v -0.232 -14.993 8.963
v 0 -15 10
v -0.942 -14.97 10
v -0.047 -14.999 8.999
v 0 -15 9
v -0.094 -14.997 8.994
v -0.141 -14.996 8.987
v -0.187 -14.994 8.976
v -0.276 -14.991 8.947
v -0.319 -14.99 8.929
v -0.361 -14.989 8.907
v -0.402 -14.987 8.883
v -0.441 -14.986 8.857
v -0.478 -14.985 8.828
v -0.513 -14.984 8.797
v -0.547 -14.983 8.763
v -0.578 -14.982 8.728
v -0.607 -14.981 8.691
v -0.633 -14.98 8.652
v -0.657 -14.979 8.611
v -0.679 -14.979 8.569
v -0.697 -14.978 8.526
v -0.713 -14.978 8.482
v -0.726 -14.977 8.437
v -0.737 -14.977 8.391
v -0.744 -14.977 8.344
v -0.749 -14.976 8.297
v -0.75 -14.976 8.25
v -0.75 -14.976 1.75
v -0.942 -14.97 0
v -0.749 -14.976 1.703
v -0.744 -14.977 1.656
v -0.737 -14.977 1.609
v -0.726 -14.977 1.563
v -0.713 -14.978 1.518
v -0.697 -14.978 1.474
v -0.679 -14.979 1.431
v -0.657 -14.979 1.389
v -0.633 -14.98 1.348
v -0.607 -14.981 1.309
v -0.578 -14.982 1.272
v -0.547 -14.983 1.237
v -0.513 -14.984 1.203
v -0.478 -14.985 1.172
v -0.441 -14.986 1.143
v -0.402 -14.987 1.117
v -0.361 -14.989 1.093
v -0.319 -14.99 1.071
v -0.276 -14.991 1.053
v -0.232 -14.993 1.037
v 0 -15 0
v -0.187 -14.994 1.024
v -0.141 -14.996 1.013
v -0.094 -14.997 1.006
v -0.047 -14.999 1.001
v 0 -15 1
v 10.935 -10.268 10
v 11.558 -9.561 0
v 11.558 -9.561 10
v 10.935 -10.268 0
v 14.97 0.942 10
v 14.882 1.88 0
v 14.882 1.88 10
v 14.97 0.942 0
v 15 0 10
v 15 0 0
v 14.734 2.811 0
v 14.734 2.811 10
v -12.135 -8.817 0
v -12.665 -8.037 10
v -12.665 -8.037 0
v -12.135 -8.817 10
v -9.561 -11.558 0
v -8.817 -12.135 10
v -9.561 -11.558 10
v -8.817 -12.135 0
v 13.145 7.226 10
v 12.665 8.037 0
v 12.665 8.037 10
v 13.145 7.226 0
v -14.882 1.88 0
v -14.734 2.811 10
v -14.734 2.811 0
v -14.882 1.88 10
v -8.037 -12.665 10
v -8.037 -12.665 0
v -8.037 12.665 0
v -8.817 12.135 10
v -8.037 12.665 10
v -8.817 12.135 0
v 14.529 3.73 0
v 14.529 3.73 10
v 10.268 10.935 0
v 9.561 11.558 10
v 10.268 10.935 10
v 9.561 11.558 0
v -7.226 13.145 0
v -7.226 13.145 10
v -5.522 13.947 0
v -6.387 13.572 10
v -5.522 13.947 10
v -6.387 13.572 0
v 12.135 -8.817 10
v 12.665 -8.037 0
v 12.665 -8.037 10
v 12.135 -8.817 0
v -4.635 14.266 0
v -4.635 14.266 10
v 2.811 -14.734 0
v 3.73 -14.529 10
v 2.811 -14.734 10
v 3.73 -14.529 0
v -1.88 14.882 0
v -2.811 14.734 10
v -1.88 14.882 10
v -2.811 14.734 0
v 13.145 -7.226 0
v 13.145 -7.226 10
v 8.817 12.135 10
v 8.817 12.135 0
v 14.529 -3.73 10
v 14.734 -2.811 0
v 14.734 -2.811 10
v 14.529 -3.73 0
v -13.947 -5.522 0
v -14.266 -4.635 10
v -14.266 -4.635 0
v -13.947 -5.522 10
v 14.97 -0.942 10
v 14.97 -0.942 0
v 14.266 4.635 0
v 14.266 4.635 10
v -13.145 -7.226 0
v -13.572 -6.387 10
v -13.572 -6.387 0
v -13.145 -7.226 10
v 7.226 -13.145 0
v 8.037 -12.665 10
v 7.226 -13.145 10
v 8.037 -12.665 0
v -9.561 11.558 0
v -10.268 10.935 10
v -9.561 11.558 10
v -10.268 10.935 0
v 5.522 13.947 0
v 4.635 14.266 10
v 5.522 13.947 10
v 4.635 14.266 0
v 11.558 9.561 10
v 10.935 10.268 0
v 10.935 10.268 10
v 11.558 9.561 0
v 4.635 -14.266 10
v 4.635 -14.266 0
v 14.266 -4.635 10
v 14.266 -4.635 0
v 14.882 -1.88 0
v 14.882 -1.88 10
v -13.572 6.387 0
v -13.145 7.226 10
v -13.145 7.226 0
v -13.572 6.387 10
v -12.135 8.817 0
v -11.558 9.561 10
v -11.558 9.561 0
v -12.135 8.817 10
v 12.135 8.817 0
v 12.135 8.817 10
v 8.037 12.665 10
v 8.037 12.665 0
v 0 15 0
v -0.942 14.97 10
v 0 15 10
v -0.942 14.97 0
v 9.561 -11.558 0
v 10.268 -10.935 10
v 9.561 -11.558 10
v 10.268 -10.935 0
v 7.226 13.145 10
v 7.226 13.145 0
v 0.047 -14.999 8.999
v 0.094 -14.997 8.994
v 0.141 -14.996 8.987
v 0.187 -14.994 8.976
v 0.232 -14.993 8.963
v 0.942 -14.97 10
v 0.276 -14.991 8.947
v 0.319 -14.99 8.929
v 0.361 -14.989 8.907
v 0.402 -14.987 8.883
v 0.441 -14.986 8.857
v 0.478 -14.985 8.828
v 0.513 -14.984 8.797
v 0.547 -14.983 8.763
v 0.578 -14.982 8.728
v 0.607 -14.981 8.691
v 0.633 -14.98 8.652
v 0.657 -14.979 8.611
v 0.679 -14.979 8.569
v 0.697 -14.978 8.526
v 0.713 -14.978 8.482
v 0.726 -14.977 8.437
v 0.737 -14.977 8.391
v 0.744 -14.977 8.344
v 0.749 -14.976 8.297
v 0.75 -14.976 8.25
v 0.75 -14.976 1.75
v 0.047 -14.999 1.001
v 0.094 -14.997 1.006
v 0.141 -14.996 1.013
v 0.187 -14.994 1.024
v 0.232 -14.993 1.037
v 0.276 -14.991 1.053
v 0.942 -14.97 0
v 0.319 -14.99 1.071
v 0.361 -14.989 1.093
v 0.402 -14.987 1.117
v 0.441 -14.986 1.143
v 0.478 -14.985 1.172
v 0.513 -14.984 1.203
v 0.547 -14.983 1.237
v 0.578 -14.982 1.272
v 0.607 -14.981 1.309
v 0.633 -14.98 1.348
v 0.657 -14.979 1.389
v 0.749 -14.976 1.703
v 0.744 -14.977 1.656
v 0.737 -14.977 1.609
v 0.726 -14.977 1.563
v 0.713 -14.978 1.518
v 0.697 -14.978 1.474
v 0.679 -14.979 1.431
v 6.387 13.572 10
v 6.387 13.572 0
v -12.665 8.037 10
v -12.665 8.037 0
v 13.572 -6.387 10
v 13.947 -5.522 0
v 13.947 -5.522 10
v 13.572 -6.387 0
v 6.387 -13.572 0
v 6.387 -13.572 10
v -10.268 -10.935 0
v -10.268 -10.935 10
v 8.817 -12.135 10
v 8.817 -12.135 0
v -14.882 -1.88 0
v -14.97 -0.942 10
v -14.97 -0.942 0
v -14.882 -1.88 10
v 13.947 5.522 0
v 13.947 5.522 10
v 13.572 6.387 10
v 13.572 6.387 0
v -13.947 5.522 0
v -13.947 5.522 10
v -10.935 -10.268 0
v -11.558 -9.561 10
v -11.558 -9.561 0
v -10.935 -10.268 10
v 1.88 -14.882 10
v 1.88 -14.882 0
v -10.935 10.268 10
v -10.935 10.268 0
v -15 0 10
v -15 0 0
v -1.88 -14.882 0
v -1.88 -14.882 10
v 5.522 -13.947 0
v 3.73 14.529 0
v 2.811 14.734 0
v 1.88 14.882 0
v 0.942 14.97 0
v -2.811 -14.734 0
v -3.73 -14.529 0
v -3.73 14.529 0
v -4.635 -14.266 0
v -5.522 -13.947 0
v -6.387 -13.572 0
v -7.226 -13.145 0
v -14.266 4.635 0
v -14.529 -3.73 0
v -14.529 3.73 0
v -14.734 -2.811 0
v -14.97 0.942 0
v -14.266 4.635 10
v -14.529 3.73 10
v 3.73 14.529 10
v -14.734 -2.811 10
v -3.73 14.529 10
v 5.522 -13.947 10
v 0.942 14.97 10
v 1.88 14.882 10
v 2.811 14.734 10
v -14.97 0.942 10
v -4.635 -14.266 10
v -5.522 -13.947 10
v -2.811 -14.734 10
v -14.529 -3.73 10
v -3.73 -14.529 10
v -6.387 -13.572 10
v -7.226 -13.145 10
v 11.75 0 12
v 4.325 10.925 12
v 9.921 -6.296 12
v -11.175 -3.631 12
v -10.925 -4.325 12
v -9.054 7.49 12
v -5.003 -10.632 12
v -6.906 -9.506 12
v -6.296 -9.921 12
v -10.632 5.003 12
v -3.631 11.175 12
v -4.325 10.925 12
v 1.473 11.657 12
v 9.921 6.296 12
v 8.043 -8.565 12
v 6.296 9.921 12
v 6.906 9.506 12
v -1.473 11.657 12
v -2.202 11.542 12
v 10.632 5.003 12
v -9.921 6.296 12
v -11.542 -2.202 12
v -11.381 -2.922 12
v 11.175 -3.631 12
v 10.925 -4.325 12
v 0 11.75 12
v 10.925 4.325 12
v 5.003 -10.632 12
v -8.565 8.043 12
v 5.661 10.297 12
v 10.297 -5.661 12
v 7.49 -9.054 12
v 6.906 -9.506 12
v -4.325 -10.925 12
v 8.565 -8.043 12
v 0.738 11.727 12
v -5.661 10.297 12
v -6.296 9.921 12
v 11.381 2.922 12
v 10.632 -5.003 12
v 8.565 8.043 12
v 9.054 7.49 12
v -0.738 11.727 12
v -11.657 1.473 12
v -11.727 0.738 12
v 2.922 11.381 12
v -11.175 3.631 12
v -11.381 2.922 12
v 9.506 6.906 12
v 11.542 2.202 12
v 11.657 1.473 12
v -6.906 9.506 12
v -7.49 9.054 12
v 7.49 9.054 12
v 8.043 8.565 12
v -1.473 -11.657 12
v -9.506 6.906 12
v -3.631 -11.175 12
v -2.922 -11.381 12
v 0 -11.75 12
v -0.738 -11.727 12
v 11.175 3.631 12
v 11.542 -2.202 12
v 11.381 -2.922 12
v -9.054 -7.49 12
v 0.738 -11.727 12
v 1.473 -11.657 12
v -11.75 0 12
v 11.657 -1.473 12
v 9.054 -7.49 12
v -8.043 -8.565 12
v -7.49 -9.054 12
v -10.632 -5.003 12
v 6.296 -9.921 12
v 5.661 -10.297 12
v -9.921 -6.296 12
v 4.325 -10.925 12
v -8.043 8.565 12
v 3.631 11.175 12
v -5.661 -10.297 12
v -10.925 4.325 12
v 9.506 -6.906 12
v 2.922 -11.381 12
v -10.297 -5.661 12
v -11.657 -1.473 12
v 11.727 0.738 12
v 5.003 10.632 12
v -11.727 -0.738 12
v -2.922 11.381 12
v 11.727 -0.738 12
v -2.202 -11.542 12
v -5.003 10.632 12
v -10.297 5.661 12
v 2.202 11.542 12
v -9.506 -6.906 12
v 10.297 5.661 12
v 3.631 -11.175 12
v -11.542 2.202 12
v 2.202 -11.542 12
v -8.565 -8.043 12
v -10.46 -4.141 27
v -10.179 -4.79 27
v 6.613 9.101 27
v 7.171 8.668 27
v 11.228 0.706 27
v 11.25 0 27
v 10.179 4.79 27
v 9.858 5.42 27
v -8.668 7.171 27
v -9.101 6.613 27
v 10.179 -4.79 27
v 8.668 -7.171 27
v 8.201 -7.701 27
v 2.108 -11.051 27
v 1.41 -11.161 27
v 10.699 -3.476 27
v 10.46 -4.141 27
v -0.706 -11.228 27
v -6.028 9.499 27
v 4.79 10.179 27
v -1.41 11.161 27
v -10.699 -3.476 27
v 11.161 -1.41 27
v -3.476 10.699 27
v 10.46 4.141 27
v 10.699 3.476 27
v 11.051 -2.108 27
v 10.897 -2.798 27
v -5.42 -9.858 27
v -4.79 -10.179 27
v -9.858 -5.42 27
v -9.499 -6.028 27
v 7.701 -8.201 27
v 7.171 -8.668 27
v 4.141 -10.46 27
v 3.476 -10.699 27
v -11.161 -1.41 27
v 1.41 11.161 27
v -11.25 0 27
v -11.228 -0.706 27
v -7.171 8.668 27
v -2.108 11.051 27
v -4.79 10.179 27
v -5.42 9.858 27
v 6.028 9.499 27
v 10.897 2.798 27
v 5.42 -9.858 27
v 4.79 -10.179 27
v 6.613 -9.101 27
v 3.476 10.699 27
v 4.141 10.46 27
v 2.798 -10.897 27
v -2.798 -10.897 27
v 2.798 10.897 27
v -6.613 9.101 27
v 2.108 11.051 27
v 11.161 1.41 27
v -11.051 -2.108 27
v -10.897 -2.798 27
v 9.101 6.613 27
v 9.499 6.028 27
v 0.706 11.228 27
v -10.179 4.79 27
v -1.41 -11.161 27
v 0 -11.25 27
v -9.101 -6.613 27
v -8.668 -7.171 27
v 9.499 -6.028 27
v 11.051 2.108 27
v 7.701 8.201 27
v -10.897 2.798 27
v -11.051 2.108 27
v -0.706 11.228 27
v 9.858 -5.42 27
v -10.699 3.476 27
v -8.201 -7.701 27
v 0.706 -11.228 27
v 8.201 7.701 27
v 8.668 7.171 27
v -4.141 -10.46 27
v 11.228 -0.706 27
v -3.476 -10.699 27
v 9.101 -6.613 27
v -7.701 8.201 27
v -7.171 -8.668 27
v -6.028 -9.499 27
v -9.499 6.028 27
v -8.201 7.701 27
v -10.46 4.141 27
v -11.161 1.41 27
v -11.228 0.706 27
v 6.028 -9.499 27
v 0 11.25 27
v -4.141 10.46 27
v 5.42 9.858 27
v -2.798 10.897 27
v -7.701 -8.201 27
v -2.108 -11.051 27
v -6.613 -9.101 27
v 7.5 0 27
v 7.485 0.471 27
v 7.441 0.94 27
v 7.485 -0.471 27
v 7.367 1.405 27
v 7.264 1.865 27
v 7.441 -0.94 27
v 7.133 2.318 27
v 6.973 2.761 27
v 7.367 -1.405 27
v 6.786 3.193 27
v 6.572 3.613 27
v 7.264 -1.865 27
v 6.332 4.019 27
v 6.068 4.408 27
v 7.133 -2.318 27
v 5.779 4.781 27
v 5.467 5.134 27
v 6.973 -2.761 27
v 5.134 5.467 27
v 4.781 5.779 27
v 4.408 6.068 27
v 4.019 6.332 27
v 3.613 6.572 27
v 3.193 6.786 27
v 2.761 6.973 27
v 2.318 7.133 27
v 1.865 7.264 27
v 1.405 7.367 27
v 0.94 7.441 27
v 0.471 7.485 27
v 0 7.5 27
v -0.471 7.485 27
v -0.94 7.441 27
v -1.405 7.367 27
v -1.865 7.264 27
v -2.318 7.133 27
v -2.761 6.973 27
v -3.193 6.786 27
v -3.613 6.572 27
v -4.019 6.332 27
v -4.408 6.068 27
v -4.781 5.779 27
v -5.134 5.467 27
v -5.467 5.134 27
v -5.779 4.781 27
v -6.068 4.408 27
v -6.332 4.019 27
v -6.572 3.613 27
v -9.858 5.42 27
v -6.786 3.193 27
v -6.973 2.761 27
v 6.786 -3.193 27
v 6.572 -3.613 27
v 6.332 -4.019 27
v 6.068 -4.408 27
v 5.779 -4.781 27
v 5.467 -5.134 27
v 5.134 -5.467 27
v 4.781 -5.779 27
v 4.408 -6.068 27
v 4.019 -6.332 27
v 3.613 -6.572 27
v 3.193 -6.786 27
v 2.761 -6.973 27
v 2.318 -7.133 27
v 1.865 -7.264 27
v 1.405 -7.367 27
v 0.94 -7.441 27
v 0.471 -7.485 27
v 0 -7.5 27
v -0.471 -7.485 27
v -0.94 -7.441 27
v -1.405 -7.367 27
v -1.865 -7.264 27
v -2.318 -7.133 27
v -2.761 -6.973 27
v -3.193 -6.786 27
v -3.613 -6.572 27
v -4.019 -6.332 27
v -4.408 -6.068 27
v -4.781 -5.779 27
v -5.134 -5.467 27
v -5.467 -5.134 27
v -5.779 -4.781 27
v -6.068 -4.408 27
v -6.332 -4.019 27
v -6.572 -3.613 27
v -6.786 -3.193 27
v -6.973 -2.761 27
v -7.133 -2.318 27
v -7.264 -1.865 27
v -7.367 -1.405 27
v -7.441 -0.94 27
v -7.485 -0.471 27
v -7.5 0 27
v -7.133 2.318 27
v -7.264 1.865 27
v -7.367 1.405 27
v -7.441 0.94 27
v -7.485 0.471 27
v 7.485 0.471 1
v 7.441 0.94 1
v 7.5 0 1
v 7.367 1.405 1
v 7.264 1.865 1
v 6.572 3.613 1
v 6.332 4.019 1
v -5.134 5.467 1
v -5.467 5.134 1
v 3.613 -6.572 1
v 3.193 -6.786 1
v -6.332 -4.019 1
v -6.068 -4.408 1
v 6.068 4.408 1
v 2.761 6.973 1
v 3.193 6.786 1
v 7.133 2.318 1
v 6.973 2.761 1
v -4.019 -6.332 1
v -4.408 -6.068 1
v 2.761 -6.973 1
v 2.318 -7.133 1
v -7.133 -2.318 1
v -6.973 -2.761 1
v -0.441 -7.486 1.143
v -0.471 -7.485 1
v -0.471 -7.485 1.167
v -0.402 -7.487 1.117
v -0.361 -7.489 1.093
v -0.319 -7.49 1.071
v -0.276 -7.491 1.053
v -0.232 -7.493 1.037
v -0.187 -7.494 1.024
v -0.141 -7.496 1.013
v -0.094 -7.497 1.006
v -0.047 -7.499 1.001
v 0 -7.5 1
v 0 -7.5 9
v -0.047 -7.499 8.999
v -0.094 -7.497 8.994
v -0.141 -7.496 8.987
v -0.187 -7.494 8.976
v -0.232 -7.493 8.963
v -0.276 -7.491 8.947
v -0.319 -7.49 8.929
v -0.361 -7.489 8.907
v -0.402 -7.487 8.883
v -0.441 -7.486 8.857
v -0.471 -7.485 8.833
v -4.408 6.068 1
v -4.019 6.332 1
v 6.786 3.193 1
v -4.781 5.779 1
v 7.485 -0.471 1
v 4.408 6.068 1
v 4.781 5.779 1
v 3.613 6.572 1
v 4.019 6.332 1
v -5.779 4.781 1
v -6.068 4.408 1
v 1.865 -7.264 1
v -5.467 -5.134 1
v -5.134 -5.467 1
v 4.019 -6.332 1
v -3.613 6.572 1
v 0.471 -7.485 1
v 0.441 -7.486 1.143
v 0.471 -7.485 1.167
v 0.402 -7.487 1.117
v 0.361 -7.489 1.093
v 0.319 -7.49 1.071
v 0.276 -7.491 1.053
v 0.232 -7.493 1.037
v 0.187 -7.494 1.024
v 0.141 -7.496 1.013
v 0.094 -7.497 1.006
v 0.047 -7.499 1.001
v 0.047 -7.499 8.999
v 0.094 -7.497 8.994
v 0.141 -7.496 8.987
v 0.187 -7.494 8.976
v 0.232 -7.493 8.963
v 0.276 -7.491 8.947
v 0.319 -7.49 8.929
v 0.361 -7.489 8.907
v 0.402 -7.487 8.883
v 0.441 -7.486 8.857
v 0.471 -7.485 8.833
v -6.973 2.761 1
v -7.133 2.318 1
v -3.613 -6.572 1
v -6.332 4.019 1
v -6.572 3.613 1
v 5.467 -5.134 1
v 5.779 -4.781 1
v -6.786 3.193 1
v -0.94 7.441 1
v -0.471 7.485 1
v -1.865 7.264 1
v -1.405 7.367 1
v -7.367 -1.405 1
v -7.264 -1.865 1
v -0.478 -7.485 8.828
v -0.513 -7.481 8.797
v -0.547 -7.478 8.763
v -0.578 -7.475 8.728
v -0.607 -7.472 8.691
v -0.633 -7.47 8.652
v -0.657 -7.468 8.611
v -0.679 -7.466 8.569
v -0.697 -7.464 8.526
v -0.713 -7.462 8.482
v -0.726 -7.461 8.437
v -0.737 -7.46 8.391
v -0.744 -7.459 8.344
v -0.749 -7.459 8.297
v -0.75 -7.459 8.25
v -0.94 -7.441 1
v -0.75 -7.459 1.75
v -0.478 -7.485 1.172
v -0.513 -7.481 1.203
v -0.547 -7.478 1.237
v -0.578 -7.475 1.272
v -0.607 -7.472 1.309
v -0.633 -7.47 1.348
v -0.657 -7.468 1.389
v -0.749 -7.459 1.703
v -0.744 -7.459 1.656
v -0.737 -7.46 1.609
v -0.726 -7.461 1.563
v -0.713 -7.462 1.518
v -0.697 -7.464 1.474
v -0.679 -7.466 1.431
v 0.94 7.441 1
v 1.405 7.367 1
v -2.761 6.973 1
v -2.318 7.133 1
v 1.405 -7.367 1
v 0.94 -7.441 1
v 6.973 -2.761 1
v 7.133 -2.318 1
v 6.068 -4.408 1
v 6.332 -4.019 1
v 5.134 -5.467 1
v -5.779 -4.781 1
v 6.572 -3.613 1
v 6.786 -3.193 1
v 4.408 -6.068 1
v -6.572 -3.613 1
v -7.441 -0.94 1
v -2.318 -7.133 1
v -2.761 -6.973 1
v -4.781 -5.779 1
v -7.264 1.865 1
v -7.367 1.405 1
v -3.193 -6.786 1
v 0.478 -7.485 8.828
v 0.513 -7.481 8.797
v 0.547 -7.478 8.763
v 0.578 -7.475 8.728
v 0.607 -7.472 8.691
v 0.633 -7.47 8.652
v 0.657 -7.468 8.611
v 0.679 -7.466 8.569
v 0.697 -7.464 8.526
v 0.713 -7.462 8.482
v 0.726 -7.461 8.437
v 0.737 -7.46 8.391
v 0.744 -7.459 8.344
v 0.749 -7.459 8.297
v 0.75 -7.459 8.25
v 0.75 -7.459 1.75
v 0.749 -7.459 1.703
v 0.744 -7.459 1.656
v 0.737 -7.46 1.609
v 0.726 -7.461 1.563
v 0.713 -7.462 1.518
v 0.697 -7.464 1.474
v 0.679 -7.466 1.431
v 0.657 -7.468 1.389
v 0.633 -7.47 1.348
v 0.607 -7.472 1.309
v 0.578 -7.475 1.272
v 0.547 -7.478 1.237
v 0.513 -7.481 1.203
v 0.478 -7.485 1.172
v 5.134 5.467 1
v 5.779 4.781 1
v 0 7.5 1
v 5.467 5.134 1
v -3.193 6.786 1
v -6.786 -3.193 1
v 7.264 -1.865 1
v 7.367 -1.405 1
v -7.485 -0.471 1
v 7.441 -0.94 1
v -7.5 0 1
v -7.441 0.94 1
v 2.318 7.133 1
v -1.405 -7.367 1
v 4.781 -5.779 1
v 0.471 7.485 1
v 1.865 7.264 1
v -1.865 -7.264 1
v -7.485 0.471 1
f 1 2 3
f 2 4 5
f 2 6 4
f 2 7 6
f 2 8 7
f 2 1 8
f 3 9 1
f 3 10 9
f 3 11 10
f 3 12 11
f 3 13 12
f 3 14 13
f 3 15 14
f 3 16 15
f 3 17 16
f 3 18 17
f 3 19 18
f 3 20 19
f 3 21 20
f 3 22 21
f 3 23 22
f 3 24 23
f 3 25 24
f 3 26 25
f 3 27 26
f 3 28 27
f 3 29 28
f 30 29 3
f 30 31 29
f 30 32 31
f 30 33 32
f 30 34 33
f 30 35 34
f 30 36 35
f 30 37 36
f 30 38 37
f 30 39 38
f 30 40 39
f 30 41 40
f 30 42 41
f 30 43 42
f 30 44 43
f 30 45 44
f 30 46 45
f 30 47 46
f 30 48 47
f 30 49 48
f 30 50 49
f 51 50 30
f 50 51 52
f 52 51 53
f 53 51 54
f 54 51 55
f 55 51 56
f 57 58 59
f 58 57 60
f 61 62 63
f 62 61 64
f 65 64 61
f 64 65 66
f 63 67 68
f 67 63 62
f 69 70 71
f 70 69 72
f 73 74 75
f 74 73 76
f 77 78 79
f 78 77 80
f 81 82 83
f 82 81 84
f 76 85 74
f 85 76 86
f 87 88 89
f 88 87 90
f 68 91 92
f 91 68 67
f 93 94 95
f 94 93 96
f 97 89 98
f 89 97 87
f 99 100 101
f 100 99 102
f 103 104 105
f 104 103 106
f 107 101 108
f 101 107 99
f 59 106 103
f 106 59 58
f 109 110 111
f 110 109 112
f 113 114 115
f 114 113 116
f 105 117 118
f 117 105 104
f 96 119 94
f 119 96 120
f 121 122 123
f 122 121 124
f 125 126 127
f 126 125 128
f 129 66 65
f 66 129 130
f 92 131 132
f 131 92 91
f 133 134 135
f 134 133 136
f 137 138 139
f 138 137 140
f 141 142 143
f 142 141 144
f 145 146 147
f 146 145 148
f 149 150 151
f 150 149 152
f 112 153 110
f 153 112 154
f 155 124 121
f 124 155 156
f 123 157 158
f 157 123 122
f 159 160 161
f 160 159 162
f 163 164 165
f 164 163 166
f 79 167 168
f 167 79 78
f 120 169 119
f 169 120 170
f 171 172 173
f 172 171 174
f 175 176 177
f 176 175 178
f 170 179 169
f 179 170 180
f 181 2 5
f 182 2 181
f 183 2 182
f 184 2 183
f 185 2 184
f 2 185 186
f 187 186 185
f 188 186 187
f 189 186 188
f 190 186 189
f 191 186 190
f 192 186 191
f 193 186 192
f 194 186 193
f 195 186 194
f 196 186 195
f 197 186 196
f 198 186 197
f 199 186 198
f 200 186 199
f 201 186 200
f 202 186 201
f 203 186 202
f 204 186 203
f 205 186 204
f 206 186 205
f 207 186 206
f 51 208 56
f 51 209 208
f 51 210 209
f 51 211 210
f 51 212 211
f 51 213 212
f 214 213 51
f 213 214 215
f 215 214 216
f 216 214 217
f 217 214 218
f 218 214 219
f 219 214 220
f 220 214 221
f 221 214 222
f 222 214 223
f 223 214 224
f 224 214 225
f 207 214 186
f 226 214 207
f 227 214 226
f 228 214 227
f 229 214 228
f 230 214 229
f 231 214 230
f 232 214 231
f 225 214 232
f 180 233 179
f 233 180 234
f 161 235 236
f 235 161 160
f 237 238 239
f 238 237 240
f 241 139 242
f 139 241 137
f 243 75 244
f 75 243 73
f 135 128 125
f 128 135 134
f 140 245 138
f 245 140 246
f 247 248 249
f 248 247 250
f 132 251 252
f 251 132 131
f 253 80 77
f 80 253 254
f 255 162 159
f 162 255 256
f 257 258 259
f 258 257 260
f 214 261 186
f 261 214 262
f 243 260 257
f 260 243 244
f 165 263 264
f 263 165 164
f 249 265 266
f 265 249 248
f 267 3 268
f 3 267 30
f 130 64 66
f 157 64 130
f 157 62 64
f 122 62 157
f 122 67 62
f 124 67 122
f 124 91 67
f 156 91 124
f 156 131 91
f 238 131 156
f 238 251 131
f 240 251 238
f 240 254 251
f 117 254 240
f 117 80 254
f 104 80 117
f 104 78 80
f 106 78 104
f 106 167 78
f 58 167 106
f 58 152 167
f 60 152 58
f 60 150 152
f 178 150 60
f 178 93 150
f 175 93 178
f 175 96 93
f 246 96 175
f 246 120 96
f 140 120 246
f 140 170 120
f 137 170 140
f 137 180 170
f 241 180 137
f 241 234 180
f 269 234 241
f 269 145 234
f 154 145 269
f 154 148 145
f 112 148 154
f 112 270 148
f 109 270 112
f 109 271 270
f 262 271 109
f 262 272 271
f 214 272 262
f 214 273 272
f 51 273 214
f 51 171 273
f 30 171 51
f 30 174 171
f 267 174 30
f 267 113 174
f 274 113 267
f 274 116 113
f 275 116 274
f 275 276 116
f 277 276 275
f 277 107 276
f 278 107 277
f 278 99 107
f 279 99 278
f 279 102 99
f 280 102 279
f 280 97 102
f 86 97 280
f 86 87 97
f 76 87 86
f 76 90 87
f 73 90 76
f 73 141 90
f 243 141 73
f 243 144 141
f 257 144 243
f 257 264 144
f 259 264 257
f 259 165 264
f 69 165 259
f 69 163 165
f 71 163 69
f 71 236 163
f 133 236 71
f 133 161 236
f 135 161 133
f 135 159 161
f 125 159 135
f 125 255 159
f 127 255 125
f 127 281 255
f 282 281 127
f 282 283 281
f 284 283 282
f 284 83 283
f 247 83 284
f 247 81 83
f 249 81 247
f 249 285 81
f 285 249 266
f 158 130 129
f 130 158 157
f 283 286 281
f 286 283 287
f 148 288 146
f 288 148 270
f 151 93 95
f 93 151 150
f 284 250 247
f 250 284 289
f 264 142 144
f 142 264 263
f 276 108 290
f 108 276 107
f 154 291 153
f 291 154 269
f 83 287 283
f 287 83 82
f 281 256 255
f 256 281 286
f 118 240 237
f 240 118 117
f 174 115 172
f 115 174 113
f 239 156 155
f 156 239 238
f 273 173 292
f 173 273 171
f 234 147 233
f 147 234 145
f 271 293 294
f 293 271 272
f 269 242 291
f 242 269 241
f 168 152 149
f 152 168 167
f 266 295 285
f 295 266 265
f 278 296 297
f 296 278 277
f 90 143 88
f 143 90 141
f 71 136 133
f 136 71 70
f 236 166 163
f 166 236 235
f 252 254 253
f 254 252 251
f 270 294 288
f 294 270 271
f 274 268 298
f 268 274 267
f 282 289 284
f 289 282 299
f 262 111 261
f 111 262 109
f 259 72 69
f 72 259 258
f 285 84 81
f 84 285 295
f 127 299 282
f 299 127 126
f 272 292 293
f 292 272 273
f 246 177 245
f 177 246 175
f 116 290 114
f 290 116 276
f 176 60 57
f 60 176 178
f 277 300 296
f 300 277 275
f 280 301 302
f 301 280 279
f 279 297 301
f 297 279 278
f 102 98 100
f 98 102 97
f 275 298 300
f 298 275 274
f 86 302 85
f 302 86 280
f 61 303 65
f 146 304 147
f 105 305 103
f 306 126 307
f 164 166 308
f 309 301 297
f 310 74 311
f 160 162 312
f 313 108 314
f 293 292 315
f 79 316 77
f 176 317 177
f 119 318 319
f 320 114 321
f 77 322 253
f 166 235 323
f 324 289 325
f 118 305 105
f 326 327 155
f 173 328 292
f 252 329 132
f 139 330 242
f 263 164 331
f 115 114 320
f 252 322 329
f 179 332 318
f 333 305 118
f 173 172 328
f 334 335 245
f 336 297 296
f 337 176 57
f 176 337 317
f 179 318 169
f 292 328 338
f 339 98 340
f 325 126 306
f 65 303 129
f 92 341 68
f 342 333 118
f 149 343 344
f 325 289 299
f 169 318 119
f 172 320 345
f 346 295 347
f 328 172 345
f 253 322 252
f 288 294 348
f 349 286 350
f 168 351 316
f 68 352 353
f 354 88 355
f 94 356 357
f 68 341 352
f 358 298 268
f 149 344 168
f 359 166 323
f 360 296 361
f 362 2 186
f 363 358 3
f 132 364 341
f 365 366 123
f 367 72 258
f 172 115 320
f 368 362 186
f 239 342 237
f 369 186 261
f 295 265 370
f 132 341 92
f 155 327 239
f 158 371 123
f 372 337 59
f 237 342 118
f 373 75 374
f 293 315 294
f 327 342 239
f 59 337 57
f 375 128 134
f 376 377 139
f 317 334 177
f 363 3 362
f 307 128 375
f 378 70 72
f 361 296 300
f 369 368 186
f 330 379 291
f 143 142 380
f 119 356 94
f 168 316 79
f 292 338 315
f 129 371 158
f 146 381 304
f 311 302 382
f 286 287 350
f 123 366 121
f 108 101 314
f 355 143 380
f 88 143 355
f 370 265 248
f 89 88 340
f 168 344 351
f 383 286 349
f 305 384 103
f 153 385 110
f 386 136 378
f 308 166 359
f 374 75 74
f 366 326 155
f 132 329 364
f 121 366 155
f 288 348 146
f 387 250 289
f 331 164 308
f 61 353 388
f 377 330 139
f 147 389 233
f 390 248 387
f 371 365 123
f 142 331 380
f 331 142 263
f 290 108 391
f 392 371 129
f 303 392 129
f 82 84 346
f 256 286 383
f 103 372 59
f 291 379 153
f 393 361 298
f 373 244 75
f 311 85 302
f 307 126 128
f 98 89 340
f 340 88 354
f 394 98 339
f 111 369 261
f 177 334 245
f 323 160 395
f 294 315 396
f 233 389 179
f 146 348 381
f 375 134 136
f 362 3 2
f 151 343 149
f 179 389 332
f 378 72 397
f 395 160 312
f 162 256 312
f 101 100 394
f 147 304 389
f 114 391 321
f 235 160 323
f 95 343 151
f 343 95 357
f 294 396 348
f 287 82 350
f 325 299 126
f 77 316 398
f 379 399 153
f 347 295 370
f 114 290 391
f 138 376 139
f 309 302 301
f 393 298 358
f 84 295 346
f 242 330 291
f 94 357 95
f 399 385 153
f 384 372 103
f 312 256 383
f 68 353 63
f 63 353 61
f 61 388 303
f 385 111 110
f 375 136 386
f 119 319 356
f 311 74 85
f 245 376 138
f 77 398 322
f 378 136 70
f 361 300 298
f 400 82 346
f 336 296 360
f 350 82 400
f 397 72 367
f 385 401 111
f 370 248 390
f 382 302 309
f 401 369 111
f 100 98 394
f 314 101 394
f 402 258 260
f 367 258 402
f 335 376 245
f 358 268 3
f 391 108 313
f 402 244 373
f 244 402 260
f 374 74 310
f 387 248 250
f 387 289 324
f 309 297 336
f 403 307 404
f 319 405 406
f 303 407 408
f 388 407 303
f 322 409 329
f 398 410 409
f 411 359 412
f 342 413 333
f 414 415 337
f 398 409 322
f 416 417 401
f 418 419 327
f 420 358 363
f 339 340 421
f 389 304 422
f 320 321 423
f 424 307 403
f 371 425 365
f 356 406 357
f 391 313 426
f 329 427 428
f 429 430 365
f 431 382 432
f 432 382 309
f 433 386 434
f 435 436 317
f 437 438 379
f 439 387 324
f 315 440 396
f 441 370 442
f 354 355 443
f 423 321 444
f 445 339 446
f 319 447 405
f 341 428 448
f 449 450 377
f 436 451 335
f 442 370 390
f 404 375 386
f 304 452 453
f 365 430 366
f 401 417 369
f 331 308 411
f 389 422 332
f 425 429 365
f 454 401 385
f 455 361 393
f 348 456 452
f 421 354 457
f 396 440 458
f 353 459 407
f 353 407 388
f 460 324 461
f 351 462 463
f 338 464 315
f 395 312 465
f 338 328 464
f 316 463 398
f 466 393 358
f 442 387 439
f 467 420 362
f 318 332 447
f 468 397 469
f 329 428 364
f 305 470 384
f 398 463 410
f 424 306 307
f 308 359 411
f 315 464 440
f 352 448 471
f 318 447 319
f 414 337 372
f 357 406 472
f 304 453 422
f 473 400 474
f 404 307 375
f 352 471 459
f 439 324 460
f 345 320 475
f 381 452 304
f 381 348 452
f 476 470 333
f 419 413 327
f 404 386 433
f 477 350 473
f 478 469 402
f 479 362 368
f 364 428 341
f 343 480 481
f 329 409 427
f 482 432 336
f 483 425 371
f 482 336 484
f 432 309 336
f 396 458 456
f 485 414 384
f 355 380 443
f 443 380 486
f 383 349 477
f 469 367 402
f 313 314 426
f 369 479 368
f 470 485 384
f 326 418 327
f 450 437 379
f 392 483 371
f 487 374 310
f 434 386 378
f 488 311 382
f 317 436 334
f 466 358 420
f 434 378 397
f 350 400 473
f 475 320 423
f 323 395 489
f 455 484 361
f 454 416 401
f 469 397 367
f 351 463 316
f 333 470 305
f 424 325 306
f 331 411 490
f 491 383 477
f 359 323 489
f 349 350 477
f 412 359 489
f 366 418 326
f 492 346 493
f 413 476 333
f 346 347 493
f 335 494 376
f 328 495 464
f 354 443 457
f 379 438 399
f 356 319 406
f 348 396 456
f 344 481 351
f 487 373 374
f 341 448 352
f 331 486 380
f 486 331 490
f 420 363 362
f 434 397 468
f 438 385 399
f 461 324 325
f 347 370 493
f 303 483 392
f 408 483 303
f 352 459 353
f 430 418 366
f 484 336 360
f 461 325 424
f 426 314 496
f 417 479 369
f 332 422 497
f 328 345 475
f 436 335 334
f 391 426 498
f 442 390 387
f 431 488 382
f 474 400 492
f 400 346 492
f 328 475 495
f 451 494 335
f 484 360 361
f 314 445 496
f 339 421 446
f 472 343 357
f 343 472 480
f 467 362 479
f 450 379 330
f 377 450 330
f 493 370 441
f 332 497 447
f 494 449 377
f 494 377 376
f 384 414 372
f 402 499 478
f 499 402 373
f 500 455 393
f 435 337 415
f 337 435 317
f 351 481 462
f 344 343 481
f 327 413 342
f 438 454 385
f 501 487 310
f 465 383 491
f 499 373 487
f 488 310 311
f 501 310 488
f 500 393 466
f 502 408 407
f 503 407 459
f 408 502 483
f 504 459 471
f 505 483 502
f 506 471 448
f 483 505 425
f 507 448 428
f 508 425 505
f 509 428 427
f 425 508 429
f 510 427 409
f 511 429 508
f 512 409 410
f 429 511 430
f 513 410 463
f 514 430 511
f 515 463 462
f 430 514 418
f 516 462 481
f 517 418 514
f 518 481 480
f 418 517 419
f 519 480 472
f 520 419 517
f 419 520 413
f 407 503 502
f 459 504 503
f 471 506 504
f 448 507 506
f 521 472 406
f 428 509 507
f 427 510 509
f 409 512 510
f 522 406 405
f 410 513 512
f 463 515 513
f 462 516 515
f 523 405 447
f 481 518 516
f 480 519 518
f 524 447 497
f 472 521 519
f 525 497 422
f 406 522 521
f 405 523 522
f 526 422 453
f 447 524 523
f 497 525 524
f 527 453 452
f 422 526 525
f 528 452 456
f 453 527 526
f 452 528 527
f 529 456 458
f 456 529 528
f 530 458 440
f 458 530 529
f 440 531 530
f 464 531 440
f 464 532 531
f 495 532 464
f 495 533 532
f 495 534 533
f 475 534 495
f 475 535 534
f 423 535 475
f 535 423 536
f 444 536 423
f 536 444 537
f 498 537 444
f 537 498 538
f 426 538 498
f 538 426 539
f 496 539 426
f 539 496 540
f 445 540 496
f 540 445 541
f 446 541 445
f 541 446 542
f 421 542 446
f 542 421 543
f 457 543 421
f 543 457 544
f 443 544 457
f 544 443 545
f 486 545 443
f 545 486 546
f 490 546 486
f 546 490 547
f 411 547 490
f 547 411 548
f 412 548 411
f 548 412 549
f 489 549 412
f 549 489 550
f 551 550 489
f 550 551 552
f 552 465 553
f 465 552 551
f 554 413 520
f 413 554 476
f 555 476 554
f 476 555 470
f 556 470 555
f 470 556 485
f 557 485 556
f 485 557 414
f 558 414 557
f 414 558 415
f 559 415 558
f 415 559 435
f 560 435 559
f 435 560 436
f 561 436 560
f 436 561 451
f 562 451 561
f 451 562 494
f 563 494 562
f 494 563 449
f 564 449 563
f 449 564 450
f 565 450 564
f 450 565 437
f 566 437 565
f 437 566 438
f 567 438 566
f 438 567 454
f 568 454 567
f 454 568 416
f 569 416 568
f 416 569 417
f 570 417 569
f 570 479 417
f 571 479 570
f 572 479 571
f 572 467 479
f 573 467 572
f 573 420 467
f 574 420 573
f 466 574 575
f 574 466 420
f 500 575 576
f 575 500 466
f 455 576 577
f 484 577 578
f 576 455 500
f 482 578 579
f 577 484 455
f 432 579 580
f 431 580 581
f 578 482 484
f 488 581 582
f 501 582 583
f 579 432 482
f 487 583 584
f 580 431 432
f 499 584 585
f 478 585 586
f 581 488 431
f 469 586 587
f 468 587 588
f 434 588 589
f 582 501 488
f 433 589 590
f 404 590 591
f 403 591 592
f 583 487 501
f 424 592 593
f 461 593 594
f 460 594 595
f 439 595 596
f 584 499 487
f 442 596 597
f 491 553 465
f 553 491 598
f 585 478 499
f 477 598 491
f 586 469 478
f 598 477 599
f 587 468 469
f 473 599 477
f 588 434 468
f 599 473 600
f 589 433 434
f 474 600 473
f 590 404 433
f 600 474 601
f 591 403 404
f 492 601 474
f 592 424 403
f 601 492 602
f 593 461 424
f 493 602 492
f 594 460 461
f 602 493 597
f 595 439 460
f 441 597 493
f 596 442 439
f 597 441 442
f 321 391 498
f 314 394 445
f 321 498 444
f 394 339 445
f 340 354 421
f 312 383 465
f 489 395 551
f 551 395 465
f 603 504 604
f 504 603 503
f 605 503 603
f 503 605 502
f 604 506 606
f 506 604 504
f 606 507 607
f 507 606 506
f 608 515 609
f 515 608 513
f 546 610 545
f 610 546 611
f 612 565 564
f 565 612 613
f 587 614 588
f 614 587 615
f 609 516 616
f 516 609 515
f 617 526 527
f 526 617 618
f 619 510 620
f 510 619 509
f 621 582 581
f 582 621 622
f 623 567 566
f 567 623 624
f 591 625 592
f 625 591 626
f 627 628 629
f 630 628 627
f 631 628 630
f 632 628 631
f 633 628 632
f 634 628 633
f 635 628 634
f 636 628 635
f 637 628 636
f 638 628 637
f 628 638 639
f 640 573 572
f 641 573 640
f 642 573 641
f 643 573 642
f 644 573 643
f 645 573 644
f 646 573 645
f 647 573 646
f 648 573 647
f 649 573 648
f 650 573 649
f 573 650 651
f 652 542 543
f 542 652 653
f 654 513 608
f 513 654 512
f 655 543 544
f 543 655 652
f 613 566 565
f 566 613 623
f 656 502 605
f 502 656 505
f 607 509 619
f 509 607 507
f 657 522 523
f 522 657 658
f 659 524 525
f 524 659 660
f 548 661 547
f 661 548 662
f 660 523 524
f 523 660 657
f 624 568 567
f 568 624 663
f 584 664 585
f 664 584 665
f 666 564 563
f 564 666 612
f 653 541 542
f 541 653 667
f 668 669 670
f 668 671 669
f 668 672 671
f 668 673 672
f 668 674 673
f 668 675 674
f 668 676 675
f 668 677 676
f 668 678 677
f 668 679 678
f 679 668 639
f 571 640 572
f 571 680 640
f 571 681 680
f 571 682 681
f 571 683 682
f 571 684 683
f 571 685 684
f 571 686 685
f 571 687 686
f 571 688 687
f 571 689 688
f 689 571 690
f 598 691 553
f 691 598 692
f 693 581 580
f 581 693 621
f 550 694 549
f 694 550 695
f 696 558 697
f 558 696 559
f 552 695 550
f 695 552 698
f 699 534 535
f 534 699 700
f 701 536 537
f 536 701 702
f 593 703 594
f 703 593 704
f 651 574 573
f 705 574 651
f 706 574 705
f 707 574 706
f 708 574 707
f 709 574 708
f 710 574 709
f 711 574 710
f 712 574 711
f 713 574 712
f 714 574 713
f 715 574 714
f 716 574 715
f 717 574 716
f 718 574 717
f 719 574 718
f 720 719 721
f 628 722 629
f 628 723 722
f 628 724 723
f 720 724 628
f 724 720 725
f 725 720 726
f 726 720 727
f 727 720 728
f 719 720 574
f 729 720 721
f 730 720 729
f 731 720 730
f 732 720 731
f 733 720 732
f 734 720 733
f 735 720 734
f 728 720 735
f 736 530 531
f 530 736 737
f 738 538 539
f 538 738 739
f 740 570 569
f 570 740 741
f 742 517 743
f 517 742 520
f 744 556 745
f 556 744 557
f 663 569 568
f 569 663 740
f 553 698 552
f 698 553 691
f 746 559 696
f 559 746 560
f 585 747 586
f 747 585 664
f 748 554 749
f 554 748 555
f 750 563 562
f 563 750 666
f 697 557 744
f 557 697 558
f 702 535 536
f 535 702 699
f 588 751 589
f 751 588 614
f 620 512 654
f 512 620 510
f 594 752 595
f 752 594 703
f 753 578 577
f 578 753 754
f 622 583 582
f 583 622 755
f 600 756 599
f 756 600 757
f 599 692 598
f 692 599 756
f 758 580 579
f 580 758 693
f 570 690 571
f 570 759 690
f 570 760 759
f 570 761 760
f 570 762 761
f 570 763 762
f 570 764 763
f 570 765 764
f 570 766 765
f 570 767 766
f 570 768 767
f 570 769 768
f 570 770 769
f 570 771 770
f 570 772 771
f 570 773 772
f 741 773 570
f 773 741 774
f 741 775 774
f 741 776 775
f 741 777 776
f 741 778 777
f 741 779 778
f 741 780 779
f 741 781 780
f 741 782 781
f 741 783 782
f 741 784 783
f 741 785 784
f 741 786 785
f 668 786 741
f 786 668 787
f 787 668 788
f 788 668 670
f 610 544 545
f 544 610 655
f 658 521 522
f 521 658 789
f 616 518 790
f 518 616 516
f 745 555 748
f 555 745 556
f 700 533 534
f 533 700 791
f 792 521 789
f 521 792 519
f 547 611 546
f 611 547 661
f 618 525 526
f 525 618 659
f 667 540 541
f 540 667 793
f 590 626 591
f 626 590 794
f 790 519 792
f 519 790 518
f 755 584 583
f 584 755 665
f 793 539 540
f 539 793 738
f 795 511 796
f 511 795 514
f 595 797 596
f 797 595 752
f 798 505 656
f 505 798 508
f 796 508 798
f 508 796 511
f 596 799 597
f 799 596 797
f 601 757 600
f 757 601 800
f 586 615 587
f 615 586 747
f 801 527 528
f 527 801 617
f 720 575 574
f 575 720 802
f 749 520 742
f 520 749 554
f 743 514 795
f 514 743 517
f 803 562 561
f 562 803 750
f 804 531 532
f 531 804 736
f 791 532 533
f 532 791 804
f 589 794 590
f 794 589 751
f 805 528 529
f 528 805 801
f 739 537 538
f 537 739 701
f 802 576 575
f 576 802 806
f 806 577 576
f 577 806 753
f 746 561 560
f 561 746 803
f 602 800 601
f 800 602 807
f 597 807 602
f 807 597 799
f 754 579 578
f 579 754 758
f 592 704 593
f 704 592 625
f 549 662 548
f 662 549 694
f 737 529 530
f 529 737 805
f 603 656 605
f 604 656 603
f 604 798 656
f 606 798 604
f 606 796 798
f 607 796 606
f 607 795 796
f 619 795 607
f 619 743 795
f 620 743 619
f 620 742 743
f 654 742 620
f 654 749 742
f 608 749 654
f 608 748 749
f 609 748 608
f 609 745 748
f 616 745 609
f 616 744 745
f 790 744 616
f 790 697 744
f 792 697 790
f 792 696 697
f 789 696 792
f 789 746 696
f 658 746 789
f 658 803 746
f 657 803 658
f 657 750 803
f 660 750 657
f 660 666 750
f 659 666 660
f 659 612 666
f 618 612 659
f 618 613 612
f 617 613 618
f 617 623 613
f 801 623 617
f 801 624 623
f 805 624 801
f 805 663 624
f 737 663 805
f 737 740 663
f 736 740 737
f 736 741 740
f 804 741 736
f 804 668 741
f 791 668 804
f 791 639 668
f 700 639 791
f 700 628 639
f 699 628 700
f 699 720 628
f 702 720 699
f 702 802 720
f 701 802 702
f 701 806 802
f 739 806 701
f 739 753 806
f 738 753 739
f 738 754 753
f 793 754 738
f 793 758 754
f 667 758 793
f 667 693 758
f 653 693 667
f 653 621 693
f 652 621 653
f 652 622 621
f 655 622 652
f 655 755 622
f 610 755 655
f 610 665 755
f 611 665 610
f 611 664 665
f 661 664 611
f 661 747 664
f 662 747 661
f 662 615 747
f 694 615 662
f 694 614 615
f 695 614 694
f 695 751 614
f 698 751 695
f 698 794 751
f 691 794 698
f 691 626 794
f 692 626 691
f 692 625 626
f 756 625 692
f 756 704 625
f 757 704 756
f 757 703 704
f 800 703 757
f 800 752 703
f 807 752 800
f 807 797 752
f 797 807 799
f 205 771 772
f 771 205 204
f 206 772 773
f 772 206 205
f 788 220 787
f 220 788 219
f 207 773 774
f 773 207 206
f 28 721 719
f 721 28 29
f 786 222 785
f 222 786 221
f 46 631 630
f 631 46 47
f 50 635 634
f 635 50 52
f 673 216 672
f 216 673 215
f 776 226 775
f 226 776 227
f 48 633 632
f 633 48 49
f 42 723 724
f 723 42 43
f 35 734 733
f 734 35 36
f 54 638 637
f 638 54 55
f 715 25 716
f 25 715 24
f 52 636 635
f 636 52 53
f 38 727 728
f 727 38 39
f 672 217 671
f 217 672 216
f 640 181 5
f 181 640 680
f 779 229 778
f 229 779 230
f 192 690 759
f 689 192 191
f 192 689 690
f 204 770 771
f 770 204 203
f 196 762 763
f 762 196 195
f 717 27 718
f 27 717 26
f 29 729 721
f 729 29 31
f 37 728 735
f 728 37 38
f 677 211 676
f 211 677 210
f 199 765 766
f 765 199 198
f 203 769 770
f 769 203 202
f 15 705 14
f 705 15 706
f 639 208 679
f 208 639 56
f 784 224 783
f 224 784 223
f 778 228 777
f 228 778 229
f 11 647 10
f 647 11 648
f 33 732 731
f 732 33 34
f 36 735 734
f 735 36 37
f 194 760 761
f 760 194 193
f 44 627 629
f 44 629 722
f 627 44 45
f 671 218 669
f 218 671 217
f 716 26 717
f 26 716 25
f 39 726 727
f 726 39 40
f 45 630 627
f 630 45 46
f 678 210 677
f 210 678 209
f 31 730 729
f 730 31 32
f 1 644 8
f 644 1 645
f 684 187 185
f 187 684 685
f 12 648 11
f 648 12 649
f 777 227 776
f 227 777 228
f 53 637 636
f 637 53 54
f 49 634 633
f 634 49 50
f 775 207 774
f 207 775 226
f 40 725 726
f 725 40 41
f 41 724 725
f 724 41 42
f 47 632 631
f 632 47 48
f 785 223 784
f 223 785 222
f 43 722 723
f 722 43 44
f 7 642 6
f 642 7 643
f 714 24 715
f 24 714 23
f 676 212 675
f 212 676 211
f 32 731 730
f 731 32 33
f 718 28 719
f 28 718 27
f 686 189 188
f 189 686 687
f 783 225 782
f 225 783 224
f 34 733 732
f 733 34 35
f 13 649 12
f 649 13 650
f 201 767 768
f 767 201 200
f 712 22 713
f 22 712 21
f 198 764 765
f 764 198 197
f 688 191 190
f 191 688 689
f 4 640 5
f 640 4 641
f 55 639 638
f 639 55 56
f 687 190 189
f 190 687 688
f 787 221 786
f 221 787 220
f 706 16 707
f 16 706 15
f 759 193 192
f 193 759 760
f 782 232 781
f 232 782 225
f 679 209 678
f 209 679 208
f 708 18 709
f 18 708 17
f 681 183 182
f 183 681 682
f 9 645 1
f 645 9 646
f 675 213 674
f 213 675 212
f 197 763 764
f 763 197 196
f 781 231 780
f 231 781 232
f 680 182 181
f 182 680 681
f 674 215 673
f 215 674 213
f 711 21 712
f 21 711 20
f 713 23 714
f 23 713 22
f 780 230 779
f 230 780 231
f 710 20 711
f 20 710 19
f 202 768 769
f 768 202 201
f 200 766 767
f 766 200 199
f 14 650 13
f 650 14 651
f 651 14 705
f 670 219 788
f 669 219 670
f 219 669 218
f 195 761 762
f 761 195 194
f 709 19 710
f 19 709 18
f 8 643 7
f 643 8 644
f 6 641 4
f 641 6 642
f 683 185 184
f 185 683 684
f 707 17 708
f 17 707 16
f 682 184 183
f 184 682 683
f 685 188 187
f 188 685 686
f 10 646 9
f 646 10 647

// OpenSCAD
NECK_DIA = 23;
NECK_HEIGHT = 15;

HEAD_DIA = 30;
HEAD_HEIGHT = 10;
HEAD_CONE_HEIGHT = 2;

HOLE_DIA = 15;
SLOT_WIDTH = 1.5;
SLOT_LENGTH = 8;

$fn = 100;

module bidet() {
  difference() {
    union() {
      cylinder(d = HEAD_DIA, h = HEAD_HEIGHT);
      translate([0, 0, HEAD_HEIGHT])
      cylinder(d1 = HEAD_DIA, d2 = NECK_DIA + 0.5, h = HEAD_CONE_HEIGHT);
      translate([0, 0, HEAD_HEIGHT + HEAD_CONE_HEIGHT])
      cylinder(d1 = NECK_DIA + 0.5, d2 = NECK_DIA - 0.5, h = NECK_HEIGHT);
    }

    #translate([0, 0, (HEAD_HEIGHT - SLOT_LENGTH)/2])
    cylinder(d = HOLE_DIA, h = NECK_HEIGHT + HEAD_HEIGHT + HEAD_CONE_HEIGHT);


    #translate([0, 0, SLOT_LENGTH/2 + (HEAD_HEIGHT - SLOT_LENGTH)/2])
    rotate([90, 0, 0])
    hull() {
      translate([0, -(SLOT_LENGTH-SLOT_WIDTH)/2, 0])
      cylinder(d = SLOT_WIDTH, h = HEAD_DIA/2);
      translate([0, (SLOT_LENGTH-SLOT_WIDTH)/2, 0])
      cylinder(d = SLOT_WIDTH, h = HEAD_DIA/2);
    }
  }
}

bidet();
